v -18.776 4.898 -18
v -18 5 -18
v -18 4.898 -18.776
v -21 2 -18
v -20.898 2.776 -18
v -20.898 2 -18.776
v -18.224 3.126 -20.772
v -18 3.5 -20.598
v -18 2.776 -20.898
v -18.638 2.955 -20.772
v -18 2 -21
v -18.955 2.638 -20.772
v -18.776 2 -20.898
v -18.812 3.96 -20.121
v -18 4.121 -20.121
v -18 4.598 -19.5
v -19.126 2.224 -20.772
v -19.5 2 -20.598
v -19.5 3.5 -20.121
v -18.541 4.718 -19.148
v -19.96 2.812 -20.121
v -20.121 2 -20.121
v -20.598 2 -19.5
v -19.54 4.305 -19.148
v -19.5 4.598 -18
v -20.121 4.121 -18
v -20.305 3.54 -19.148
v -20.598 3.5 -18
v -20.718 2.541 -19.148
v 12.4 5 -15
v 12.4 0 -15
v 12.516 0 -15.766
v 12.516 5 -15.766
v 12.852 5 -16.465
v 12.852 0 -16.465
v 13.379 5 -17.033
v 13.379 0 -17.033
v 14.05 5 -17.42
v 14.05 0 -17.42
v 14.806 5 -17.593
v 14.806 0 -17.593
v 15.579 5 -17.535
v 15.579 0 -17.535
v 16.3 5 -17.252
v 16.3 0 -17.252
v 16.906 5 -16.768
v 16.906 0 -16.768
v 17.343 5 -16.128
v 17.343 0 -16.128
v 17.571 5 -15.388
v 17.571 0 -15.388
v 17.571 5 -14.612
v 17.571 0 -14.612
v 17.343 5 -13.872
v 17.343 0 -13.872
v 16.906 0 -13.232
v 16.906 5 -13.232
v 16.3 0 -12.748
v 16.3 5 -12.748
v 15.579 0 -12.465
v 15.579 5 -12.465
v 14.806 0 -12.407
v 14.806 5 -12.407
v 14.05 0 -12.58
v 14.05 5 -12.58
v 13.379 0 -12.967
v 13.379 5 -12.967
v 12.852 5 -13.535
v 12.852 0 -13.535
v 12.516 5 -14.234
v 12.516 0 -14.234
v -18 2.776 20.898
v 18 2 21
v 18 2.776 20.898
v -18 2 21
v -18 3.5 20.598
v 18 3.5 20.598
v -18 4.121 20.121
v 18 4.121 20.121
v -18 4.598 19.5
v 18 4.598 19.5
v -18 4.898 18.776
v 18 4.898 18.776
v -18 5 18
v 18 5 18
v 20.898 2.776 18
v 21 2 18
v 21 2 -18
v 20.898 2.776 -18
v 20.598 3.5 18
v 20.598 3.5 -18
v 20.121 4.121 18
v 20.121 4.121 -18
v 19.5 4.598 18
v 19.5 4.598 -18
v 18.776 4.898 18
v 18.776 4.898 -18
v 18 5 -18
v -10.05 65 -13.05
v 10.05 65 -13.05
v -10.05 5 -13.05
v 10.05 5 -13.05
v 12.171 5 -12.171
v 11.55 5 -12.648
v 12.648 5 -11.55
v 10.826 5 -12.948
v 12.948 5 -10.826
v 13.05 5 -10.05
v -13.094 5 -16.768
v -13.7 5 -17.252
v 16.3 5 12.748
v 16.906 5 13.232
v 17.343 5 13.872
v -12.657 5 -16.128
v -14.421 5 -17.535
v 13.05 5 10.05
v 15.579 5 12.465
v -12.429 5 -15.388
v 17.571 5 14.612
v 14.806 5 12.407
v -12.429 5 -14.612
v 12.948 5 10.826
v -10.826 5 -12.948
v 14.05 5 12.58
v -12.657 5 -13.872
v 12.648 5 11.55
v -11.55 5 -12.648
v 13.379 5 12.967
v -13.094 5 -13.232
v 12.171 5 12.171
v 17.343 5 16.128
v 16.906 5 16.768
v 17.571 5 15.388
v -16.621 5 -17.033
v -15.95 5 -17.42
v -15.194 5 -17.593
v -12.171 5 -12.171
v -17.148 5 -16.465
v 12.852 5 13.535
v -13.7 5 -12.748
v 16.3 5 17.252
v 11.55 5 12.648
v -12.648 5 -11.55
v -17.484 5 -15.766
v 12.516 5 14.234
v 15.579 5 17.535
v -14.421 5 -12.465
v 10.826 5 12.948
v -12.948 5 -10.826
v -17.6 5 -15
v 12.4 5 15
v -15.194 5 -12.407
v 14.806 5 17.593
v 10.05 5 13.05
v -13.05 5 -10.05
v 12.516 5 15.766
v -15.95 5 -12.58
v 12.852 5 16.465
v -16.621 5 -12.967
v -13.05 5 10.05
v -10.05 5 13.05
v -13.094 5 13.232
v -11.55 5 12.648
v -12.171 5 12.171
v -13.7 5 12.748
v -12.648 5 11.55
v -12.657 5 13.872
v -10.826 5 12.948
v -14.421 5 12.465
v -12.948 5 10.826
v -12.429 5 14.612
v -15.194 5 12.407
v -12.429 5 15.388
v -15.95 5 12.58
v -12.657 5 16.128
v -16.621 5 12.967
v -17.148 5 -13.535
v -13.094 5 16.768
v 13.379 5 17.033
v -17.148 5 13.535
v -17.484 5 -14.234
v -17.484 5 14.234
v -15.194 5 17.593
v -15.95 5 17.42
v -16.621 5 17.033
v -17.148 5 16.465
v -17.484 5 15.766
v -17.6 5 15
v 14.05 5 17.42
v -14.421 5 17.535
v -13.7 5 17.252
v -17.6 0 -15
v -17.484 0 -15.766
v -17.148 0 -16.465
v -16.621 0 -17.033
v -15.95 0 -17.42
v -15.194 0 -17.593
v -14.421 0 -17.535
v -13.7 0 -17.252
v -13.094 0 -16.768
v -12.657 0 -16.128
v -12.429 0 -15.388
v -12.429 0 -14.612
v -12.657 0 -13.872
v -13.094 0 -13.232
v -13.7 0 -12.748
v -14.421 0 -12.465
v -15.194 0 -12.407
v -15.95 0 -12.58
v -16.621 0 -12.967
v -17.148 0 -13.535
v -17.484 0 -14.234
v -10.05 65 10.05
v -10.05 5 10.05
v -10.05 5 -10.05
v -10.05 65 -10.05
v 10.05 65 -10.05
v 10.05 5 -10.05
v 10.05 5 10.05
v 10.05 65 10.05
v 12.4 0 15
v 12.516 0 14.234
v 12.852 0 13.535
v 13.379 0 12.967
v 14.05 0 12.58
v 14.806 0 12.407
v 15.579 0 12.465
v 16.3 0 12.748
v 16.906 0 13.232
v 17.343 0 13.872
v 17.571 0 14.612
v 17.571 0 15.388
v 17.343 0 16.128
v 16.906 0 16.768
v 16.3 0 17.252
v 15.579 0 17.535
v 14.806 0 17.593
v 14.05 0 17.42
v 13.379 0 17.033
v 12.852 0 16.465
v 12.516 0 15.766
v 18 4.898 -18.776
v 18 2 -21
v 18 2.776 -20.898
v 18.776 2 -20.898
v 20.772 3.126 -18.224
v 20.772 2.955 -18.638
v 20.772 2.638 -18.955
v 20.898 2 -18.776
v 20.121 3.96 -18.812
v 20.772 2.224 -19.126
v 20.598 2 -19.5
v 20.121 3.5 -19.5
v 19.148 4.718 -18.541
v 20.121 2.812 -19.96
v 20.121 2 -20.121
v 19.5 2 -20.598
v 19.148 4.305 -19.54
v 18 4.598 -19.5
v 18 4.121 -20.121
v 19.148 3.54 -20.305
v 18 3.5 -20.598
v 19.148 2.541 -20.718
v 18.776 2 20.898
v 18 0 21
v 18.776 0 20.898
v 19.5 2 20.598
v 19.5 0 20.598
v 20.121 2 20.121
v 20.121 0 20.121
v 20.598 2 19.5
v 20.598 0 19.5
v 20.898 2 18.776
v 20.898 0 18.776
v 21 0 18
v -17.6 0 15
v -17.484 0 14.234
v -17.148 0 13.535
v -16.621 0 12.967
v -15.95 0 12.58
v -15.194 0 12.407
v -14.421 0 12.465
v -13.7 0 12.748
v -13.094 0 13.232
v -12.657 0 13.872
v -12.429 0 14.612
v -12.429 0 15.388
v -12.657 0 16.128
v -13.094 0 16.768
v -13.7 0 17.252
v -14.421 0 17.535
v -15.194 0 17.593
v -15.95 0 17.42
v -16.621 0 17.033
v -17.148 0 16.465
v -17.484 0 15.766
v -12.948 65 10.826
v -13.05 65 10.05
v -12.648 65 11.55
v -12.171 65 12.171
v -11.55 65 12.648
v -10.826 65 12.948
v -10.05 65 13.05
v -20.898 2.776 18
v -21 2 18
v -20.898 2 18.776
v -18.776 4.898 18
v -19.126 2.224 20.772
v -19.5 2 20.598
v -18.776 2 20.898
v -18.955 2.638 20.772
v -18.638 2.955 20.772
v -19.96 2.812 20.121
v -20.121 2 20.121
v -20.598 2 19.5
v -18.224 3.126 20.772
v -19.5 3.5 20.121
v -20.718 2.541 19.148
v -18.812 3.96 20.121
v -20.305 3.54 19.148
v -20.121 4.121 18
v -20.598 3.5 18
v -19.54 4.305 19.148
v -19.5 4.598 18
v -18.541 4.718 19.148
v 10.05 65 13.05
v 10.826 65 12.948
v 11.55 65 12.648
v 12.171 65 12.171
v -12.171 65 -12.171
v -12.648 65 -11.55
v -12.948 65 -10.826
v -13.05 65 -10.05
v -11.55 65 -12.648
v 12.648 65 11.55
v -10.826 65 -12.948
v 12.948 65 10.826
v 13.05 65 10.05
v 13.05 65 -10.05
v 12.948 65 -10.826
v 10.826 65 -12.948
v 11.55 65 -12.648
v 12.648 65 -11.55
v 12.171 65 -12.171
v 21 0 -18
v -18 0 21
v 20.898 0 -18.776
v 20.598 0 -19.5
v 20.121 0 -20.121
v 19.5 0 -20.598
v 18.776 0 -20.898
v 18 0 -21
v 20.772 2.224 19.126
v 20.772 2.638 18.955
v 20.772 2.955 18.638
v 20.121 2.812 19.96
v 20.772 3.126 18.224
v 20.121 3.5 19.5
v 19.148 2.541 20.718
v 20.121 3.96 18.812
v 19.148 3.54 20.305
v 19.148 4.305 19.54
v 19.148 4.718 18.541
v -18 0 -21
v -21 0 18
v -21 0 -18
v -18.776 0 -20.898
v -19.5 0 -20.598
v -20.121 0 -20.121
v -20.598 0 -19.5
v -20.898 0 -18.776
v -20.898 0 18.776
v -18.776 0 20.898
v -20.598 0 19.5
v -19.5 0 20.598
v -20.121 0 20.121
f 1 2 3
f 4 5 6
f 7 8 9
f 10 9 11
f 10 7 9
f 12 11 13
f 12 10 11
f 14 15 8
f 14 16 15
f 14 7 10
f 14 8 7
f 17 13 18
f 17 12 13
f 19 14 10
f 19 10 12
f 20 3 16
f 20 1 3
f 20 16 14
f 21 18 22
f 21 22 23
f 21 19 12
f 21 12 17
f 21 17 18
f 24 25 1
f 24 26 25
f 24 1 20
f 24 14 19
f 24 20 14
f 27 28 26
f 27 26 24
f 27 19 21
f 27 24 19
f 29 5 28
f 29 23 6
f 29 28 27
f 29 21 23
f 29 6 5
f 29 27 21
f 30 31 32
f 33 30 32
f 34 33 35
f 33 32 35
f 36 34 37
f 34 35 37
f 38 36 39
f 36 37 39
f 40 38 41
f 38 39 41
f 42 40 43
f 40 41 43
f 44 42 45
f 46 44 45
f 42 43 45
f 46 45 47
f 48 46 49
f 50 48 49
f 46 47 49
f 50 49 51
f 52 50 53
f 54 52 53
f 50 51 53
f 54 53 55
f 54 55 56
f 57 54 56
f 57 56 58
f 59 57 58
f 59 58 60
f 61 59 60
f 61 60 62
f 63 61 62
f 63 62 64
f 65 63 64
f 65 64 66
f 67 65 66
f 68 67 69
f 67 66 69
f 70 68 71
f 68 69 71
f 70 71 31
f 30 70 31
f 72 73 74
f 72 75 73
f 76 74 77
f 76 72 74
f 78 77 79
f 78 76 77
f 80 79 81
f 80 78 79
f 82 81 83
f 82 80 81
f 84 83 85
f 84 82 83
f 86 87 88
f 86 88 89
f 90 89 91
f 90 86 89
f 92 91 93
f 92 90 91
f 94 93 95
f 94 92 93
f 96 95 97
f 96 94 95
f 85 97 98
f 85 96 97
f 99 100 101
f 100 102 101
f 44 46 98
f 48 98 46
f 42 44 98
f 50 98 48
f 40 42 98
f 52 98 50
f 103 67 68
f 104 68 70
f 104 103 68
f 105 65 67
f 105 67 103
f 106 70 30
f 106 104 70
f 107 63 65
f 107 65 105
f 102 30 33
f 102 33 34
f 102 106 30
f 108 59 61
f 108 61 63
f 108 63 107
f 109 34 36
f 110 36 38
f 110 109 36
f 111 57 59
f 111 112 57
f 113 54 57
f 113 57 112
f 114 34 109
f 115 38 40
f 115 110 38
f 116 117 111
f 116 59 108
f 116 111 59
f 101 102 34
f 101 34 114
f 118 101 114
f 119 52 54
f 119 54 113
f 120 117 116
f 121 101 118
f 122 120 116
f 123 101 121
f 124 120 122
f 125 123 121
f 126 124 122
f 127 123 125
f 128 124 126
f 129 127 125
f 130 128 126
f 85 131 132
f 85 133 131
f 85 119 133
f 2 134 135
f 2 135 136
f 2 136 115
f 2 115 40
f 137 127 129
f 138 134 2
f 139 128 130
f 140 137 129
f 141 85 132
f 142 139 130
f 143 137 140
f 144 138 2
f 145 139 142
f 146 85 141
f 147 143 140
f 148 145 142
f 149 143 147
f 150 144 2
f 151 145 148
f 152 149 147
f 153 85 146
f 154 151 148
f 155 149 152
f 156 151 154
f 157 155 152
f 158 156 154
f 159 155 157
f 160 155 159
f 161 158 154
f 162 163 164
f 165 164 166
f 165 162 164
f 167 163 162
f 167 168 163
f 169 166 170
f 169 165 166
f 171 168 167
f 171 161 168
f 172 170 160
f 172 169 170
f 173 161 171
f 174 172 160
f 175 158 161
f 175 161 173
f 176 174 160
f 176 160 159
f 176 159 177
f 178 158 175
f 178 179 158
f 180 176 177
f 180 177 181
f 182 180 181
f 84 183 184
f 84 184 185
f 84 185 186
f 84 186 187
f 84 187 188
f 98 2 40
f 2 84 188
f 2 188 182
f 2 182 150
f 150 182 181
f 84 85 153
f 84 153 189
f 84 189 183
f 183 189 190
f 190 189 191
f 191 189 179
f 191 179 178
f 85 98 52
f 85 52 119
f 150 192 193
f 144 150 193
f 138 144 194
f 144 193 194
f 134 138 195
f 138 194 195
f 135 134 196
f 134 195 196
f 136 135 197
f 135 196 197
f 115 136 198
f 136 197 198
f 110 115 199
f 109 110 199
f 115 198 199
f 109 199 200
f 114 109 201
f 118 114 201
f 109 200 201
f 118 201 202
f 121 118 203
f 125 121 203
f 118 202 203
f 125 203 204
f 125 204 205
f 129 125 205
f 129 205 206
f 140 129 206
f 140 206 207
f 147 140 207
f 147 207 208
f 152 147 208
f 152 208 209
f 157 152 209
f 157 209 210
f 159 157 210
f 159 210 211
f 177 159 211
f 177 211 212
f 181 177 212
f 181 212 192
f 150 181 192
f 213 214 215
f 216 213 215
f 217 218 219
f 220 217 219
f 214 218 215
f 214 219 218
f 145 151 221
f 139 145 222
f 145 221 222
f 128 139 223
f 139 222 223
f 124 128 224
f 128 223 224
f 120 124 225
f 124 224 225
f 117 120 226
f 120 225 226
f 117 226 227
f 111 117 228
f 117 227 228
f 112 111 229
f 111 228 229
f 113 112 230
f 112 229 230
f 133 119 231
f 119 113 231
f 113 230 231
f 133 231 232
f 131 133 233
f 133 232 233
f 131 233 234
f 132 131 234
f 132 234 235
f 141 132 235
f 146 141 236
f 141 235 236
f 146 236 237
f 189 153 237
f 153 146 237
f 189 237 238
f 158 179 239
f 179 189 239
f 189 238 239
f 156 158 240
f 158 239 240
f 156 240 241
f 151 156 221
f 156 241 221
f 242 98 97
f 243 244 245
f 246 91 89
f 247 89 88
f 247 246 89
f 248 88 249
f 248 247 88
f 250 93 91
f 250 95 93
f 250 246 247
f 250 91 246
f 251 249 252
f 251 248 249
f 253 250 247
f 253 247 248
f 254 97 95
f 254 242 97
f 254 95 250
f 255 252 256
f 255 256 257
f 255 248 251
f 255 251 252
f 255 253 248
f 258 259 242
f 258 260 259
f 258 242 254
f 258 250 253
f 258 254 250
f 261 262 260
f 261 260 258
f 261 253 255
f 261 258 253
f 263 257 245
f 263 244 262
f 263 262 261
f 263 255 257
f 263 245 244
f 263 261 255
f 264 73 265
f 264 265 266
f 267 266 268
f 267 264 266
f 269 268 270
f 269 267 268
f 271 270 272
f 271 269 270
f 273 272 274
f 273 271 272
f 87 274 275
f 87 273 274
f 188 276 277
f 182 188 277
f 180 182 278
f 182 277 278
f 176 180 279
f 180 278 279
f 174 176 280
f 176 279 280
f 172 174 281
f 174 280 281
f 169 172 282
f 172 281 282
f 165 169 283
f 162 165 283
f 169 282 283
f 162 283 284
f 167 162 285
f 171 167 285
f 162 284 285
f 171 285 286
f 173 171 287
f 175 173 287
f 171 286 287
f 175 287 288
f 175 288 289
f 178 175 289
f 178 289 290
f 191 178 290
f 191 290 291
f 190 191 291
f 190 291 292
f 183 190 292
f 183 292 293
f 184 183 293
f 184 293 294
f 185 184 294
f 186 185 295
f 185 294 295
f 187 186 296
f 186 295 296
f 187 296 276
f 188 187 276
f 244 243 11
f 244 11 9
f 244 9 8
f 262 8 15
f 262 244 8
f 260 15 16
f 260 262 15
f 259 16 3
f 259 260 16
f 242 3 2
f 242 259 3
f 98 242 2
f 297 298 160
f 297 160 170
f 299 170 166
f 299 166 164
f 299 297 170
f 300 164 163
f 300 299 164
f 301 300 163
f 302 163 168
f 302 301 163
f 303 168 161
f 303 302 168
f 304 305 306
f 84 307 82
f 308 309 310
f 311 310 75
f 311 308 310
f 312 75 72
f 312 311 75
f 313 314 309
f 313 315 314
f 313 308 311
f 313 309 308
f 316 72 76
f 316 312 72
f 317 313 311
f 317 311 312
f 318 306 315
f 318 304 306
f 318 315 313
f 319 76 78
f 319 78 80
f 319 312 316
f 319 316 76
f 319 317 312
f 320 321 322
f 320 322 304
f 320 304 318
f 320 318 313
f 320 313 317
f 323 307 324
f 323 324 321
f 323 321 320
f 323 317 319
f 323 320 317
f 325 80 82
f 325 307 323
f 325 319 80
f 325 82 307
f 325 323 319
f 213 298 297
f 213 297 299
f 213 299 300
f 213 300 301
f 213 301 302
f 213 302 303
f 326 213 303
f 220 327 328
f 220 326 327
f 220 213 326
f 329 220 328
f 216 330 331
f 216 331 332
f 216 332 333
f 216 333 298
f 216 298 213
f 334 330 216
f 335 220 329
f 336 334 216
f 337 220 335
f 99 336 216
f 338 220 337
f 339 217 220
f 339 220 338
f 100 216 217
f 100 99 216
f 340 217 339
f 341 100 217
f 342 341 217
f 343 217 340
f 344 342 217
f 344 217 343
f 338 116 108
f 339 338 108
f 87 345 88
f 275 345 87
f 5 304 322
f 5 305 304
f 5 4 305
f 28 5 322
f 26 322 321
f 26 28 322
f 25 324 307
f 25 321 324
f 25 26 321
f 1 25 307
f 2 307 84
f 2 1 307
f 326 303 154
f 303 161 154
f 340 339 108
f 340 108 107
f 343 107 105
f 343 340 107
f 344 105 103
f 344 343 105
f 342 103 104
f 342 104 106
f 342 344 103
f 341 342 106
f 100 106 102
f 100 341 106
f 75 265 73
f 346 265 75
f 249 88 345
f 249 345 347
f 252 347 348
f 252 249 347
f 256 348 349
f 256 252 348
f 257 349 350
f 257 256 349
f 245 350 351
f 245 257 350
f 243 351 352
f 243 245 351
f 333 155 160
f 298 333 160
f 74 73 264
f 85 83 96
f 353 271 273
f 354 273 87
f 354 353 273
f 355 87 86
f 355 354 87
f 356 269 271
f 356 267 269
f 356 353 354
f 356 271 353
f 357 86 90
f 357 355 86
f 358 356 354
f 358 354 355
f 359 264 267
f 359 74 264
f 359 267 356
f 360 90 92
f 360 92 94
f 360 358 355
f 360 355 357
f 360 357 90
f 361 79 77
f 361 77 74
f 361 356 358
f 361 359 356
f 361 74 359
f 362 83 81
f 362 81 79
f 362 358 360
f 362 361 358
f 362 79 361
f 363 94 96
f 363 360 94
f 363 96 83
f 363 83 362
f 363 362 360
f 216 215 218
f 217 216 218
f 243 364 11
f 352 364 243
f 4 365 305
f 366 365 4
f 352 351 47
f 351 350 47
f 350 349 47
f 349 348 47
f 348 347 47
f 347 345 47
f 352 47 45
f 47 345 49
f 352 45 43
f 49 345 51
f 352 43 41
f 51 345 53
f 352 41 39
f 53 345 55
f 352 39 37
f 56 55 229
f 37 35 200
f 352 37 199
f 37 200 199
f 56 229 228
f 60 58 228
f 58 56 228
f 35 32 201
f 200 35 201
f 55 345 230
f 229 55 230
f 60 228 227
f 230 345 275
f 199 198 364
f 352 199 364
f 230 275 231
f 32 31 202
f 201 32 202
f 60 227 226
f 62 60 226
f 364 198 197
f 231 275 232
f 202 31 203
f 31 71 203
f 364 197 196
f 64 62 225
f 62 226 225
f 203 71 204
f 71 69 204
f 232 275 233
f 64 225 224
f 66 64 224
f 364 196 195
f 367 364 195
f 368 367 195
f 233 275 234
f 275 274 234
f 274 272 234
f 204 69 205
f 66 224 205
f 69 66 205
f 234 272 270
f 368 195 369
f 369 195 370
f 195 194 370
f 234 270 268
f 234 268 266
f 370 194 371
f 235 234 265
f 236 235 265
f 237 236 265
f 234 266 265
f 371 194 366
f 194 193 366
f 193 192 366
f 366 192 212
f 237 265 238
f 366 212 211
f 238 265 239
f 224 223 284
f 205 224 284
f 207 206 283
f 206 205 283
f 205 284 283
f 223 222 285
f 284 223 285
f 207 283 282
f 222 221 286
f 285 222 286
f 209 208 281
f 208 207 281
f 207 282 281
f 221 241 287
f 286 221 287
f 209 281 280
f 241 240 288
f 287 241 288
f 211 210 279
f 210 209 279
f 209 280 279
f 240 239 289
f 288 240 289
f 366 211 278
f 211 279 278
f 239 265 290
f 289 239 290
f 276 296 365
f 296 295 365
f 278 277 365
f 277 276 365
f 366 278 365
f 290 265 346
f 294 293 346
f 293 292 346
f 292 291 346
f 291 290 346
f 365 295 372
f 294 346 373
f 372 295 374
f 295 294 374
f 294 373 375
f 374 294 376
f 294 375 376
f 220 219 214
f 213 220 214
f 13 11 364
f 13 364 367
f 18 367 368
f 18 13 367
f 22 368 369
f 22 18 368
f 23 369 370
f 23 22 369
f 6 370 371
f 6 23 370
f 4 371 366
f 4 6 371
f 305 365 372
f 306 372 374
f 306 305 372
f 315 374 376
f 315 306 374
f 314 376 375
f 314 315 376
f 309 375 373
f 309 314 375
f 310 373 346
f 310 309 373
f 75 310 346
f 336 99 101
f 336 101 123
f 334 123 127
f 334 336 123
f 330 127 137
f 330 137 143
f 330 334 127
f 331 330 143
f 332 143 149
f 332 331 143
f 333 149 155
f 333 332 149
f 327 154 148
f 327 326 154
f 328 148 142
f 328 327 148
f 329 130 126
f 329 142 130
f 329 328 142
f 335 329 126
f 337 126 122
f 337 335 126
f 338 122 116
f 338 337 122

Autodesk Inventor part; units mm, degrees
ref_plane "YZ Plane" through (0, 0, 0) normal (1, 0, 0) x (0, 1, 0)
ref_plane "XZ Plane" through (0, 0, 0) normal (0, 1, 0) x (-1, 0, 0)
ref_plane "XY Plane" through (0, 0, 0) normal (0, 0, 1) x (1, 0, 0)
sketch "스케치2" plane through (0, 0, 0) normal (0, 1, 0) x (-1, 0, 0)
  line L0 (15, 15) -> (-15, 15)
  line L1 (-15, 15) -> (-15, -15)
  line L2 (-15, -15) -> (15, -15)
  line L3 (15, -15) -> (15, 15)
  line L4 (15, 15) -> (-15, -15) construction
  line L5 (-15, 15) -> (15, -15) construction
  circle A0 centre (15, -15) radius 2.6
  circle A1 centre (-15, -15) radius 2.6
  circle A2 centre (15, 15) radius 2.6
  circle A3 centre (-15, 15) radius 2.6
  line L6 (21, -21) -> (-21, -21)
  line L7 (-21, -21) -> (-21, 21)
  line L8 (-21, 21) -> (21, 21)
  line L9 (21, 21) -> (21, -21)
  line L10 (10.05, 10.05) -> (-10.05, 10.05)
  line L11 (-10.05, 10.05) -> (-10.05, -10.05)
  line L12 (-10.05, -10.05) -> (10.05, -10.05)
  line L13 (10.05, -10.05) -> (10.05, 10.05)
  line L14 (10.05, 10.05) -> (-10.05, -10.05) construction
  line L15 (-10.05, 10.05) -> (10.05, -10.05) construction
  line L16 (-15.05, -15.05) -> (-15.05, 15.05)
  line L17 (-15.05, 15.05) -> (15.05, 15.05)
  line L18 (15.05, 15.05) -> (15.05, -15.05)
  line L19 (15.05, -15.05) -> (-15.05, -15.05)
  point P0 (0, 0)
  dimension "d16" = 30
  dimension "d17" = 30
  dimension "d18" = 5.2
  dimension "d21" = 30
  dimension "d24" = 30
  dimension "d27" = 6
  dimension "d28" = 20.1
  dimension "d29" = 20.1
  dimension "d30" = 5
extrude "돌출2" add sketch "스케치2" along normal blind 5 contours A3 L17 A2 L0 | L0 A2 L3 A0 L2 A1 L1 A3 | L1 A1 L16 A3 | A2 L18 A0 L3 | L2 A0 L19 A1 | L6 L7 L8 L9 | L13 L12 L11 L10
sketch "스케치3" plane through (0, 5, 0) normal (0, 1, 0) x (1, 0, 0)
  line L0 (-10.05, 10.05) -> (10.05, 10.05)
  line L1 (10.05, 10.05) -> (10.05, -10.05)
  line L2 (10.05, -10.05) -> (-10.05, -10.05)
  line L3 (-10.05, -10.05) -> (-10.05, 10.05)
  line L4 (-10.05, 10.05) -> (10.05, -10.05) construction
  line L5 (10.05, 10.05) -> (-10.05, -10.05) construction
  line L6 (13.05, 13.05) -> (-13.05, 13.05)
  line L7 (-13.05, 13.05) -> (-13.05, -13.05)
  line L8 (-13.05, -13.05) -> (13.05, -13.05)
  line L9 (13.05, -13.05) -> (13.05, 13.05)
  point P0 (0, 0)
  dimension "d33" = 20.1
  dimension "d34" = 20.1
  dimension "d35" = 3
extrude "돌출3" add sketch "스케치3" along normal blind 60
fillet "모깎기1" radius 3 12 edges at (-21, 5, 0) (0, 5, -21) (0, 5, 21) (21, 5, 0) (-21, 2.5, -21) (-21, 2.5, 21) (21, 2.5, 21) (21, 2.5, -21) (-13.05, 35, 13.05) (13.05, 35, 13.05) (13.05, 35, -13.05) (-13.05, 35, -13.05)
properties part number "Profile_Plate_Holder"
